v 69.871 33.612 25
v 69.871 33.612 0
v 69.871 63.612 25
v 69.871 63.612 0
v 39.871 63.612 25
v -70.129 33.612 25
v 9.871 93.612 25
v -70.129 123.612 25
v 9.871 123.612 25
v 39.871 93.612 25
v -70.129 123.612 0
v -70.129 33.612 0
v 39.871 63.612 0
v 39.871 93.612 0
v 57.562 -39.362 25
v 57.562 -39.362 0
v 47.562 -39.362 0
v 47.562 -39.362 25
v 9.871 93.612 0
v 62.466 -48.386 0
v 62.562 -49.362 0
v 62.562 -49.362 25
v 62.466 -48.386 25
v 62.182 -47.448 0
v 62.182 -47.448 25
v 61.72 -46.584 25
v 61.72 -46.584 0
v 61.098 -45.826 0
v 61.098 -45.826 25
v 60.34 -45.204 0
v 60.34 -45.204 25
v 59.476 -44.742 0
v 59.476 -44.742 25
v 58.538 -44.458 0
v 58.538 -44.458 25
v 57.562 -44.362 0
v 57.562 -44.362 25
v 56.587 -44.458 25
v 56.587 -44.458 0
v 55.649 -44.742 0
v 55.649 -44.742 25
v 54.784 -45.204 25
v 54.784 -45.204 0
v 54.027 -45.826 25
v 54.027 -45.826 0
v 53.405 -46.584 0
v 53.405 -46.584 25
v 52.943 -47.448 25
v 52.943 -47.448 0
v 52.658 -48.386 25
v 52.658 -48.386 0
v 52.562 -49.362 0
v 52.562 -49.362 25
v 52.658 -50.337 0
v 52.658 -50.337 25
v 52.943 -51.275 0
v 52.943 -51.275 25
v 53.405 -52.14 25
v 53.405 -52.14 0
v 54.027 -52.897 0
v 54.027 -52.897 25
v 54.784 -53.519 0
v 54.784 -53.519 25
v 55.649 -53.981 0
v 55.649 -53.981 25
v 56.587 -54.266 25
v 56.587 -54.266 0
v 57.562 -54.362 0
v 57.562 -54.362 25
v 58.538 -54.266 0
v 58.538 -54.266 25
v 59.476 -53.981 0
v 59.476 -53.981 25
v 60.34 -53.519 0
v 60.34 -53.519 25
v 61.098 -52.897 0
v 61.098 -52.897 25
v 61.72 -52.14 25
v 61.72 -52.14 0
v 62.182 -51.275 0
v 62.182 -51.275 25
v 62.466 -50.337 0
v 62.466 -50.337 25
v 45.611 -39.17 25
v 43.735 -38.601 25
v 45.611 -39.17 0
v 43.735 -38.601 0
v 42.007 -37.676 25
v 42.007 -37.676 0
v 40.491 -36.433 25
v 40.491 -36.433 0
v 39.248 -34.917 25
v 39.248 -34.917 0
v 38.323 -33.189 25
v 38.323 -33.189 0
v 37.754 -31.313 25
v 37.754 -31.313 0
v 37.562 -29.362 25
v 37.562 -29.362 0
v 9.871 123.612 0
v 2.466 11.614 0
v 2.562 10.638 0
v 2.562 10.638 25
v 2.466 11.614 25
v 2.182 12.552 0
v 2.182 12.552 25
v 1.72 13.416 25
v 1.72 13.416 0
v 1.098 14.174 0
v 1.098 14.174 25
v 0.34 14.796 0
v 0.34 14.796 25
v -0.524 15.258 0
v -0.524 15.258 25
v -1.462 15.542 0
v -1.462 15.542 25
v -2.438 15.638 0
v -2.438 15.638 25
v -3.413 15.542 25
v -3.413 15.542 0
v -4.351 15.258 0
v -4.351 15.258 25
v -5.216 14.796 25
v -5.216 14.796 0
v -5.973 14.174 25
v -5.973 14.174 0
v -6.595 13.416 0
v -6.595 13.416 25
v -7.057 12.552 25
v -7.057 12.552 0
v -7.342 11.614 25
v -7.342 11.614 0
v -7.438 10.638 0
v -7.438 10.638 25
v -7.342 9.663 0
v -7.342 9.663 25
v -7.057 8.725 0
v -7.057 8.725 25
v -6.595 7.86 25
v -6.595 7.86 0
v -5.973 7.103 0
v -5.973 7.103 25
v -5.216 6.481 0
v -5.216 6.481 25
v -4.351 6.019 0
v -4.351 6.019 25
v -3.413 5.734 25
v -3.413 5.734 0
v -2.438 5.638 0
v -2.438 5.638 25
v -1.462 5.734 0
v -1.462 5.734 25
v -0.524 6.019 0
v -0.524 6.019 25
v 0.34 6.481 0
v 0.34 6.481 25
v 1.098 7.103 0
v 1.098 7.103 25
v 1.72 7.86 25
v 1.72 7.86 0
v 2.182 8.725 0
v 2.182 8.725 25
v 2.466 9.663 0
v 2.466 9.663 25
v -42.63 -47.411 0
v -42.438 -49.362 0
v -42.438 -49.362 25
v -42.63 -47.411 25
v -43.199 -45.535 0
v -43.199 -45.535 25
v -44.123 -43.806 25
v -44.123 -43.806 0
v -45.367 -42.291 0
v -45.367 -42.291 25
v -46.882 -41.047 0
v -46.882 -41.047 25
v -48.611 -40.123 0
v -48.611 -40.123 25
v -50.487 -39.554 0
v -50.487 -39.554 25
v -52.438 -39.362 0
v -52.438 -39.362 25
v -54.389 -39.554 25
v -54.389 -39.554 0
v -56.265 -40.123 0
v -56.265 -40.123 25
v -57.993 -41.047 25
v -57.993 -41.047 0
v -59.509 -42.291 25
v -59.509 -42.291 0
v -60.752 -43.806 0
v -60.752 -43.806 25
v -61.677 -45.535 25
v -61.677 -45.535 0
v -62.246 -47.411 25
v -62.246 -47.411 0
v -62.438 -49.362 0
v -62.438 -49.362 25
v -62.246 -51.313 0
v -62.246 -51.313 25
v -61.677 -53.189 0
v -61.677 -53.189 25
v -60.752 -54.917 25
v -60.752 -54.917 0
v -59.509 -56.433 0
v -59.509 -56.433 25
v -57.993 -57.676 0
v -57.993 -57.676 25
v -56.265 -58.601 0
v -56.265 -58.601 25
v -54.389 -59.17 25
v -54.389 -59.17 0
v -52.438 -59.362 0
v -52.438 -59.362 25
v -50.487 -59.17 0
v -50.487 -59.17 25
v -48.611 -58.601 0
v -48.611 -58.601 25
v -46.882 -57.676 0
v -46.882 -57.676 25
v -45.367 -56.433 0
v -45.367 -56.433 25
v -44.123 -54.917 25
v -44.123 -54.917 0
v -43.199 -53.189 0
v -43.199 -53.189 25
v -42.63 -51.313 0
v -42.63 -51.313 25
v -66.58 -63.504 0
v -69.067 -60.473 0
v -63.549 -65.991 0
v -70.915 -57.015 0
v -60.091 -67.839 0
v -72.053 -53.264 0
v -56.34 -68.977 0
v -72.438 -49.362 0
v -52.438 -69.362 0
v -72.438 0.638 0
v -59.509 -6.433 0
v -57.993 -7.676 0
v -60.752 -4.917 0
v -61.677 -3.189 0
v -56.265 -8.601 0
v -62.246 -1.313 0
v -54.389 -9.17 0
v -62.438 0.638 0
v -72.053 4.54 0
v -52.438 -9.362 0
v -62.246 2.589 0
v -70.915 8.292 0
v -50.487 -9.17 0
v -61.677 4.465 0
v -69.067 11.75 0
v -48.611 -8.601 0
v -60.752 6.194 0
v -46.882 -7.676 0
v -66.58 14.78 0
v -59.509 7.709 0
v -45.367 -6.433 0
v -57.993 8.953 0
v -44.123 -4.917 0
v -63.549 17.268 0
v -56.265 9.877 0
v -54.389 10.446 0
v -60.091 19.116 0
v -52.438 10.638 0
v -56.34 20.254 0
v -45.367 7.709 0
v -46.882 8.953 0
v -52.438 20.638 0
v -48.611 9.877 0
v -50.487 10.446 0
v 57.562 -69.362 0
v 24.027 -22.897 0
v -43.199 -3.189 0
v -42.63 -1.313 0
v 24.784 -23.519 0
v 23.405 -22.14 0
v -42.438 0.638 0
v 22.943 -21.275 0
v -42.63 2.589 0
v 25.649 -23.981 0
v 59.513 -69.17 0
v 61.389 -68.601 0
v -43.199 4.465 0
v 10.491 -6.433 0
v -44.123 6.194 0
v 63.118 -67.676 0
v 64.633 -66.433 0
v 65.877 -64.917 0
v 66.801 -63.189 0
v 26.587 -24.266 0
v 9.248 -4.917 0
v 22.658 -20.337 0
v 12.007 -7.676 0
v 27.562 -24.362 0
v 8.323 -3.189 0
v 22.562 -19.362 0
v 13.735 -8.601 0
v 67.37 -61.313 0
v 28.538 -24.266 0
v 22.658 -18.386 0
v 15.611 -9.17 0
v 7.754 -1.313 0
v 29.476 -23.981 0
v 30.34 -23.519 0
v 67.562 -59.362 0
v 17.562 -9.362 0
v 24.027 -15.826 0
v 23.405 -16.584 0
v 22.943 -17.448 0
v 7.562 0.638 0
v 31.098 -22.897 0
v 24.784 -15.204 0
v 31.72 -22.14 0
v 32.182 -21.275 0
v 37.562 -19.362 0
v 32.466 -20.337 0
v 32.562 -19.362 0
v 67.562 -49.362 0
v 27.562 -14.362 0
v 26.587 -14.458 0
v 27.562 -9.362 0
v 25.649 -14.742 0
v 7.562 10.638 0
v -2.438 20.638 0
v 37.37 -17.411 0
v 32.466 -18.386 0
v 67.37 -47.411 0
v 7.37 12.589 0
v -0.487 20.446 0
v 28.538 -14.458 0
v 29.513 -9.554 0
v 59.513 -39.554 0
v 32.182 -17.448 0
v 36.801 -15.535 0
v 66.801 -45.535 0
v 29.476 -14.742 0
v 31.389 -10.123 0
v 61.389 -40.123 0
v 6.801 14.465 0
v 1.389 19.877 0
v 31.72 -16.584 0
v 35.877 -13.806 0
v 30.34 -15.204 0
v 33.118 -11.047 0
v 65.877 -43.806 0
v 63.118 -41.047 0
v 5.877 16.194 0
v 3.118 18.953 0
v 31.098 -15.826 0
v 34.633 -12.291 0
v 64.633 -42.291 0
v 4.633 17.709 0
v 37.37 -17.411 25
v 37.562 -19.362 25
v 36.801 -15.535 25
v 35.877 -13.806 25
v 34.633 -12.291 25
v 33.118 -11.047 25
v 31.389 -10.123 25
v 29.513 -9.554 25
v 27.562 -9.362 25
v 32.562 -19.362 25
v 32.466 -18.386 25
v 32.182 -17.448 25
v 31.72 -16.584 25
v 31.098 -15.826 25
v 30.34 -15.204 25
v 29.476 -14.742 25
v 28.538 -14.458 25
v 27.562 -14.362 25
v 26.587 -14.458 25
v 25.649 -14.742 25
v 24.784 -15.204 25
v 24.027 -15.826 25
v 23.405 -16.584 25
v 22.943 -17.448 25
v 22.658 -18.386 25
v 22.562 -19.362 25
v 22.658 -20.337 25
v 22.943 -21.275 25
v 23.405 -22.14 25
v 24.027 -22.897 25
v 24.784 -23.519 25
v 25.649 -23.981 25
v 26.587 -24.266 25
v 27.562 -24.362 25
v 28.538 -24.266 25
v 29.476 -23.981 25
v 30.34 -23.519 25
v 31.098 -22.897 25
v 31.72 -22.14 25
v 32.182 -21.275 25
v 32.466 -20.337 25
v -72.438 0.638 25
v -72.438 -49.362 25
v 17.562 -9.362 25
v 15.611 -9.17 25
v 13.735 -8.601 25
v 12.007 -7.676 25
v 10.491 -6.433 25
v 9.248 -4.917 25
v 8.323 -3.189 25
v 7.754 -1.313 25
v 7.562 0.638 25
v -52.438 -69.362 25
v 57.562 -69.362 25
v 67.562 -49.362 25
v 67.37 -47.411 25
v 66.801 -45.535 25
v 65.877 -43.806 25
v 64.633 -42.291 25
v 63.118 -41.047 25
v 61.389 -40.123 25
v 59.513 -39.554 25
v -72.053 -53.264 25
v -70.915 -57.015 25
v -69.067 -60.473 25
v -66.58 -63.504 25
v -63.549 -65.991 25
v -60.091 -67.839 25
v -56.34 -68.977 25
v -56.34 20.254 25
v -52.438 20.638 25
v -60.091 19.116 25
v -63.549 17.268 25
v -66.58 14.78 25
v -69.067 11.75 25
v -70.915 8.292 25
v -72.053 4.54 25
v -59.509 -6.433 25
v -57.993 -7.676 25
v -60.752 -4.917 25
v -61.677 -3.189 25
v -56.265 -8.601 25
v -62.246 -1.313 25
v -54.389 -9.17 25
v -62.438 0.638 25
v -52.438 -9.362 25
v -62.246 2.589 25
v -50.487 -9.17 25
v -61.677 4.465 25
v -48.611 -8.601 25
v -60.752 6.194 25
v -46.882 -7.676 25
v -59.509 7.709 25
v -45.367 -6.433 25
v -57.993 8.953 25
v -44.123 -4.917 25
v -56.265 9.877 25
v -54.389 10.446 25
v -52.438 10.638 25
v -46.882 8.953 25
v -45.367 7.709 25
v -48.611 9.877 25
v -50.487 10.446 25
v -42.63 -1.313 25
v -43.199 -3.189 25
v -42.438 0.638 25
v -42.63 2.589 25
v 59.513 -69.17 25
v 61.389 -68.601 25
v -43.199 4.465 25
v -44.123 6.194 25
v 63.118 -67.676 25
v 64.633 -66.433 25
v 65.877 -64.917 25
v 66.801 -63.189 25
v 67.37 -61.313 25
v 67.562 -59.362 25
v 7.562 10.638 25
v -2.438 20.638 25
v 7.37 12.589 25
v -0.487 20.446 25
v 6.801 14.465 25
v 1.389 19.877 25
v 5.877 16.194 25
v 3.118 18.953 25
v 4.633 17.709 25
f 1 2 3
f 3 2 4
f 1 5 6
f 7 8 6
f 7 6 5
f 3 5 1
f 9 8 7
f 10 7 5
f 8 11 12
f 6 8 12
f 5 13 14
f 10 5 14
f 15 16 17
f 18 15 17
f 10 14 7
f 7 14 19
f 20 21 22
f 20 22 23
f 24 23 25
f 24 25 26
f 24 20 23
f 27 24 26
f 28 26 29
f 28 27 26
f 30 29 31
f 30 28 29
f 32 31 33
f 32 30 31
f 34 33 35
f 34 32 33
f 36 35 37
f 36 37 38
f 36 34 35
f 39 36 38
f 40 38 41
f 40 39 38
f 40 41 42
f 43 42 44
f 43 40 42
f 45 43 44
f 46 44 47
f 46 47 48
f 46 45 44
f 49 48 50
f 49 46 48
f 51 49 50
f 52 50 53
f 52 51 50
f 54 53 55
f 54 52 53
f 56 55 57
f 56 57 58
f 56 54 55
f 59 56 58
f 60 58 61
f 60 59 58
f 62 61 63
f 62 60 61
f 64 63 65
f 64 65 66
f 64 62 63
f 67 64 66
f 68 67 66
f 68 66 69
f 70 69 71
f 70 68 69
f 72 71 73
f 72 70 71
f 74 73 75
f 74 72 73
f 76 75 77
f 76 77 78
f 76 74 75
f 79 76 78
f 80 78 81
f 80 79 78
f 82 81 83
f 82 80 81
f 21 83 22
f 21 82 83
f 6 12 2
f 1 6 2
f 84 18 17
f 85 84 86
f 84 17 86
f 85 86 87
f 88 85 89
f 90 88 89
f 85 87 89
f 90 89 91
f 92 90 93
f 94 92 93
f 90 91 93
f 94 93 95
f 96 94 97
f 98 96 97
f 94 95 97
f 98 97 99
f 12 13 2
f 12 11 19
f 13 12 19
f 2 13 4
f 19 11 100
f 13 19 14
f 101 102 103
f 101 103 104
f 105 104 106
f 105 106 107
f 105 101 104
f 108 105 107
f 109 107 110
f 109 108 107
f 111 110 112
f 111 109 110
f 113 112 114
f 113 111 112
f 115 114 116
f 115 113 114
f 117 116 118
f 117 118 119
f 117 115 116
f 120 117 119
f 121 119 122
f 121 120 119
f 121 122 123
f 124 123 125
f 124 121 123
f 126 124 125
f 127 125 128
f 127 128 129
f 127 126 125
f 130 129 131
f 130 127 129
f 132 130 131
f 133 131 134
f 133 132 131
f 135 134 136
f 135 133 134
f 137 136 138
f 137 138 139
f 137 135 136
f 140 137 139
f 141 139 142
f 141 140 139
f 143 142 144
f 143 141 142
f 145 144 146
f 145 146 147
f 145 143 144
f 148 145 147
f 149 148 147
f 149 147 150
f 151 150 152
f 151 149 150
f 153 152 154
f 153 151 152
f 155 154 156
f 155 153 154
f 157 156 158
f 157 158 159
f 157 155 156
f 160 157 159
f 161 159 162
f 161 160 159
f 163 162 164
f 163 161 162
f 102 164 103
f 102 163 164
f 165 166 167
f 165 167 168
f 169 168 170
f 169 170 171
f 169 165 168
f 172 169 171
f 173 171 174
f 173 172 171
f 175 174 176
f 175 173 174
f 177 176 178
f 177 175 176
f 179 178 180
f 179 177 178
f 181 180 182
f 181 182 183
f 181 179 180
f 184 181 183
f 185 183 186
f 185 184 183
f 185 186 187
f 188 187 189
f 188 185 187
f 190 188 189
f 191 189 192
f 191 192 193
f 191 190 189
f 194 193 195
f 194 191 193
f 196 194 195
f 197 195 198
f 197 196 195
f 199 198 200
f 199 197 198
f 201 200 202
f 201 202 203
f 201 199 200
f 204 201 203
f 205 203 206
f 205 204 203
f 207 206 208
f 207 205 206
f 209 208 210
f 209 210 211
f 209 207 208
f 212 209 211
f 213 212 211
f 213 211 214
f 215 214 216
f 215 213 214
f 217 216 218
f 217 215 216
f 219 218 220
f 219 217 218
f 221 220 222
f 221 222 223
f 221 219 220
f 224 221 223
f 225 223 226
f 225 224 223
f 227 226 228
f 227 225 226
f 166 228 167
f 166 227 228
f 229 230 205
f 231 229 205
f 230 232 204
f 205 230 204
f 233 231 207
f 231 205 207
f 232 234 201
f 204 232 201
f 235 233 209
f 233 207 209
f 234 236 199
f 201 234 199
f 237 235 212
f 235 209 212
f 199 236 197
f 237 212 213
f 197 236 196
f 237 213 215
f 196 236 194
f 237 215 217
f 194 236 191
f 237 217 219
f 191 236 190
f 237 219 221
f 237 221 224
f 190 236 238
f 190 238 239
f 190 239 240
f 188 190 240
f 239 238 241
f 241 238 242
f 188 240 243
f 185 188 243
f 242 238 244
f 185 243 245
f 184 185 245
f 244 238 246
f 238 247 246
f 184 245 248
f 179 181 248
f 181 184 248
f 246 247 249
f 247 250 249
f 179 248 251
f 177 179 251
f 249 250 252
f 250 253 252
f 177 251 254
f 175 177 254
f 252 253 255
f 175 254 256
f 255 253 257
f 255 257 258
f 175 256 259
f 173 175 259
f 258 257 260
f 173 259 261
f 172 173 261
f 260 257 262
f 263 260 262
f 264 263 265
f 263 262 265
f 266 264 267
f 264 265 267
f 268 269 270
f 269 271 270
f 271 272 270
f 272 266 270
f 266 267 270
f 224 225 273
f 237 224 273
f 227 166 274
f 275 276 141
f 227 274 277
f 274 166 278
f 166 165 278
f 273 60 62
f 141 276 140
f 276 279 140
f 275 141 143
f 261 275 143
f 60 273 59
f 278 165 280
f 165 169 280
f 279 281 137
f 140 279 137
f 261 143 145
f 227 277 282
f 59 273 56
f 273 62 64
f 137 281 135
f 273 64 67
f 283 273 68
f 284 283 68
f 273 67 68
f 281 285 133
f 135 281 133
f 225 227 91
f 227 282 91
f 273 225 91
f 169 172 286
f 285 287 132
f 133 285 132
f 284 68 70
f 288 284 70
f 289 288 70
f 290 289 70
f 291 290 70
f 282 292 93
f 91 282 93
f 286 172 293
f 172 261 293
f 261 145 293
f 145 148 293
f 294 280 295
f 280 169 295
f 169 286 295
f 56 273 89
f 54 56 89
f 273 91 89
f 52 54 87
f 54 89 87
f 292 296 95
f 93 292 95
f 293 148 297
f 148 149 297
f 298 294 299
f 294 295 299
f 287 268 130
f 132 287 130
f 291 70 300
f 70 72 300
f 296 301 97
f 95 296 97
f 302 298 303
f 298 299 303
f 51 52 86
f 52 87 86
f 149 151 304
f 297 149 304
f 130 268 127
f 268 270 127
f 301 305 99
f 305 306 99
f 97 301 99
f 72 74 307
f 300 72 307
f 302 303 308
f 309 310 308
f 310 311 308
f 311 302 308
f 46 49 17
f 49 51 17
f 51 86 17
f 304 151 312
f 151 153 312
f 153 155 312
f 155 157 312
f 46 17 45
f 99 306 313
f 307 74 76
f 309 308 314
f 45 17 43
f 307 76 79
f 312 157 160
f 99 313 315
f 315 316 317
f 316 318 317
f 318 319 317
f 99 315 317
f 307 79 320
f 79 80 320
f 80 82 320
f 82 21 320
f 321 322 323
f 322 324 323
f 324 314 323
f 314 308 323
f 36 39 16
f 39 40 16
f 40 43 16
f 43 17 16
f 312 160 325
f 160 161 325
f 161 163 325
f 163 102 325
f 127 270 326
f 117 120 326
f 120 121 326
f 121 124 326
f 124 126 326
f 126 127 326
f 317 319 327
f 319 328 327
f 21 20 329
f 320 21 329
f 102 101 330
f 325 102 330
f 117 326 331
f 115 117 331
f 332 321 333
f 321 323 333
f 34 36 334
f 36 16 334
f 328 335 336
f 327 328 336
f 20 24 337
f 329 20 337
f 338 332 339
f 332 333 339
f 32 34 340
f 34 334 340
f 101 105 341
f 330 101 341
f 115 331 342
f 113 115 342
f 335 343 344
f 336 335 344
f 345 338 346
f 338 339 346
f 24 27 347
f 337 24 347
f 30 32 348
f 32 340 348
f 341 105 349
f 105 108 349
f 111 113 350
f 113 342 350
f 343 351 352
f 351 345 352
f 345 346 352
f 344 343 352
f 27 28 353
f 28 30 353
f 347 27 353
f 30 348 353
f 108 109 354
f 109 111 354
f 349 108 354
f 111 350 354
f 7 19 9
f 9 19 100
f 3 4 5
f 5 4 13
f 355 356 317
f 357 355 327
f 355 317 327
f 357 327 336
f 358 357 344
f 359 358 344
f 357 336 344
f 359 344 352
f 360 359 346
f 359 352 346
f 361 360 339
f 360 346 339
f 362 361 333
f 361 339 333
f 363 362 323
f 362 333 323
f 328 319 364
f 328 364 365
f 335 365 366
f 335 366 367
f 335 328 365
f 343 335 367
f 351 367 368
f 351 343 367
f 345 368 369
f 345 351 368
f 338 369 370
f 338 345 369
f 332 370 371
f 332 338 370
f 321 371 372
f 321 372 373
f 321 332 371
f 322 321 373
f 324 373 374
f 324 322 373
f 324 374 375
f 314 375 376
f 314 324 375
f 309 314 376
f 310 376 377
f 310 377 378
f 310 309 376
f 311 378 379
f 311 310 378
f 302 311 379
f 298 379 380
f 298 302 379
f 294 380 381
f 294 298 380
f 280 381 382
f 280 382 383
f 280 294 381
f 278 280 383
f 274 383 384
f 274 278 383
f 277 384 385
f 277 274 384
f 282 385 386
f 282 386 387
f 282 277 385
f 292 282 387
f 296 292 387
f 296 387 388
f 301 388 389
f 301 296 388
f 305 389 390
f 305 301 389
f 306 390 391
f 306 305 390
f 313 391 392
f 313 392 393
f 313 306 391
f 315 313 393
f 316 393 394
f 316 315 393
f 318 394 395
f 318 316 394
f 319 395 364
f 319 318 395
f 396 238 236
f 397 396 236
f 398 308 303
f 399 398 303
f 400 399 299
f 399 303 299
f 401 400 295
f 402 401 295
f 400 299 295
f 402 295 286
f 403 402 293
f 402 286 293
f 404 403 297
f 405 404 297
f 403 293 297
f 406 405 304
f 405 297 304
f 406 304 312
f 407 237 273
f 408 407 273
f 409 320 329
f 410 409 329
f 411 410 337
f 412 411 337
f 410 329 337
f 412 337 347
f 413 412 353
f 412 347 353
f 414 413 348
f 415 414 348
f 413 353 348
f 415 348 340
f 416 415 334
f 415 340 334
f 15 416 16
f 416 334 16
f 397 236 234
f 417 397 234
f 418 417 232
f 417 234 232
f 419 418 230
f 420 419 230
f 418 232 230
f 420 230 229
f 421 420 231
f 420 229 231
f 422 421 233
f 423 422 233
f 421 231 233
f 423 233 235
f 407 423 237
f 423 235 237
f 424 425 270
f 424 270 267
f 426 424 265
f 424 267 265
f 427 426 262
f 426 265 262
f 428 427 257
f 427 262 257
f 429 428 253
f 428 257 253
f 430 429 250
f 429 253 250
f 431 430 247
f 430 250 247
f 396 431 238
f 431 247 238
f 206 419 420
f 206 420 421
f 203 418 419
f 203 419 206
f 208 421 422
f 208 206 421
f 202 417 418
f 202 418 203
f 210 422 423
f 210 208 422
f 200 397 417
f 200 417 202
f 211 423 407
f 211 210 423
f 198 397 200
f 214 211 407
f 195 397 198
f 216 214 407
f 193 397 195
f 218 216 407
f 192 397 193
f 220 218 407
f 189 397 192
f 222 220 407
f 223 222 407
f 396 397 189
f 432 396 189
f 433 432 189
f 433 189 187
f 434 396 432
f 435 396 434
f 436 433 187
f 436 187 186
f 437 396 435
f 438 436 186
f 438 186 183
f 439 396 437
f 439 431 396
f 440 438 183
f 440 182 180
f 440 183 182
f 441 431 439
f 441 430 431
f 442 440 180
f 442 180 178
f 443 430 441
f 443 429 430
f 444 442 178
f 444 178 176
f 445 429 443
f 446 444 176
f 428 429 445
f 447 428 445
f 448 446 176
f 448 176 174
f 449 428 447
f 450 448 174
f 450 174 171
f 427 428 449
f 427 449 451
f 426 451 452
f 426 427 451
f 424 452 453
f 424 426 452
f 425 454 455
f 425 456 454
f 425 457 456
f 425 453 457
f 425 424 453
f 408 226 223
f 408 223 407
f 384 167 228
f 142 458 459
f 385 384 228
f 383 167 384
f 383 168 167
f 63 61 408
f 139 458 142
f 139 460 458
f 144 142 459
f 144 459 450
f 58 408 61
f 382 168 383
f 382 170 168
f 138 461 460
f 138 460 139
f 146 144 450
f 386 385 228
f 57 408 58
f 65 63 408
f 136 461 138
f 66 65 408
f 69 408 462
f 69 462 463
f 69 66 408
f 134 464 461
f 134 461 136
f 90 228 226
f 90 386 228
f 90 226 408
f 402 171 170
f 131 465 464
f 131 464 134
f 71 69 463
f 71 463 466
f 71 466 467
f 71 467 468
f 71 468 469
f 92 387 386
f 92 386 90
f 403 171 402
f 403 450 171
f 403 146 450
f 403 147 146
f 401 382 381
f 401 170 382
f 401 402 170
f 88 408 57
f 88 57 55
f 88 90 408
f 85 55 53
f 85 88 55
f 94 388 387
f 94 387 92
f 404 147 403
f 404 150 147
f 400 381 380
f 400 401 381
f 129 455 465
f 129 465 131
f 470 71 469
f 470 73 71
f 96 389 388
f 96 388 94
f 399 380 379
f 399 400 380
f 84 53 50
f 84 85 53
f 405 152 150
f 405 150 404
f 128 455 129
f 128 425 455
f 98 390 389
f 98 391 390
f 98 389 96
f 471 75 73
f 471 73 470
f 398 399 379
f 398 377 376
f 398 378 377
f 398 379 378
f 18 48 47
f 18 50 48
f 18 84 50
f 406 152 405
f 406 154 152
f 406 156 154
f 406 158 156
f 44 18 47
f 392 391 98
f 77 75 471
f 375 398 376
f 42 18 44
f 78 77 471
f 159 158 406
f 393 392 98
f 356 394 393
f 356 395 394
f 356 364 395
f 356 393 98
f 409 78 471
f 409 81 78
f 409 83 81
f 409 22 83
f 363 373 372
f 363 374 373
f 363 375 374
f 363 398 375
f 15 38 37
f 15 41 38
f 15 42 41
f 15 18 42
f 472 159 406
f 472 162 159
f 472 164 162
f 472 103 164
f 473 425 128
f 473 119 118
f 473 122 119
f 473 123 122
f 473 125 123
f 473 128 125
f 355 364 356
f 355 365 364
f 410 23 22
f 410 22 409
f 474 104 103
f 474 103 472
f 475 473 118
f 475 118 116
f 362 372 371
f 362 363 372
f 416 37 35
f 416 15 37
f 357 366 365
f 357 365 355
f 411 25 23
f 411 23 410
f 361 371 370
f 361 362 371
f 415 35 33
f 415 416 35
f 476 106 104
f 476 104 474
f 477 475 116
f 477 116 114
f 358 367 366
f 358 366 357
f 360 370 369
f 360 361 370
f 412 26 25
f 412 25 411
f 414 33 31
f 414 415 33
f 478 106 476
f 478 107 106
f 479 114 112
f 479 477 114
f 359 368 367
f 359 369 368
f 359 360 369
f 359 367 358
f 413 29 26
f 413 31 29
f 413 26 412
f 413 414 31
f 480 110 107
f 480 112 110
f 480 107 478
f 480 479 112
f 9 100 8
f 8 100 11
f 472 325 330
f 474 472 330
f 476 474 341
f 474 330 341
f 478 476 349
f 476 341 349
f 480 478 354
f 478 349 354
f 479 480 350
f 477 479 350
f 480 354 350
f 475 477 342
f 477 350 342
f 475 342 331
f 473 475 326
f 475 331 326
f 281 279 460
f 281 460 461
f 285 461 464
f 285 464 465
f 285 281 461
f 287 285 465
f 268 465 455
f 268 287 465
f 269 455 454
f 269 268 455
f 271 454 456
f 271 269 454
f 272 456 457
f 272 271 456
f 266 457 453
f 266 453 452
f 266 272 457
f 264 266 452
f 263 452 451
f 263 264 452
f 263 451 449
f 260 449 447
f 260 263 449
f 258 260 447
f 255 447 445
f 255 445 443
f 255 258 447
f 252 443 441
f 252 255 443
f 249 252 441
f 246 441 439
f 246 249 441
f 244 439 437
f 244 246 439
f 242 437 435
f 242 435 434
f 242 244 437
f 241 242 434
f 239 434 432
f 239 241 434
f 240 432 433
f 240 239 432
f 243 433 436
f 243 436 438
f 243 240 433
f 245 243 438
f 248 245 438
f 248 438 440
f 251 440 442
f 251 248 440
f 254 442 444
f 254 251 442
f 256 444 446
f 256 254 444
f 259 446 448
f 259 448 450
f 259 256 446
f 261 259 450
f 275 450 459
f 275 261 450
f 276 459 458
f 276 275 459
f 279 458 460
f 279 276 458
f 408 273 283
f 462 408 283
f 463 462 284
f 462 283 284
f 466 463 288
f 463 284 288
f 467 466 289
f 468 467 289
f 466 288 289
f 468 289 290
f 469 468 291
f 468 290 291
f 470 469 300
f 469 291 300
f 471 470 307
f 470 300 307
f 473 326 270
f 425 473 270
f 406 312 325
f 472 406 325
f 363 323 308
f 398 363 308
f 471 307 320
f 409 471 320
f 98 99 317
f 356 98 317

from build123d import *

# Parameters (mm, degrees)
F0_R     = 10
F0_R_2   = 5
F1_DEPTH = 25


with BuildPart() as f1:
    # F0 (on Top) → F1 (new body)
    with BuildSketch(Plane.XY):
        with BuildLine():
            ThreePointArc((-72.437731, -49.361743), (-66.579867, -63.503879), (-52.437731, -69.361743))
            Line((-52.437731, -69.361743), (57.562269, -69.361743))
            ThreePointArc((57.562269, -69.361743), (64.633336, -66.432811), (67.562269, -59.361743))
            Line((67.562269, -59.361743), (67.562269, -49.361743))
            ThreePointArc((67.562269, -49.361743), (64.633336, -42.290676), (57.562269, -39.361743))
            Line((57.562269, -39.361743), (47.562269, -39.361743))
            ThreePointArc((47.562269, -39.361743), (40.491201, -36.432811), (37.562269, -29.361743))
            Line((37.562269, -29.361743), (37.562269, -19.361743))
            ThreePointArc((37.562269, -19.361743), (34.633336, -12.290676), (27.562269, -9.361743))
            Line((27.562269, -9.361743), (17.562269, -9.361743))
            ThreePointArc((17.562269, -9.361743), (10.491201, -6.432811), (7.562269, 0.638257))
            Line((7.562269, 0.638257), (7.562269, 10.638257))
            ThreePointArc((7.562269, 10.638257), (4.633336, 17.709324), (-2.437731, 20.638257))
            Line((-2.437731, 20.638257), (-52.437731, 20.638257))
            ThreePointArc((-52.437731, 20.638257), (-66.579867, 14.780392), (-72.437731, 0.638257))
            Line((-72.437731, 0.638257), (-72.437731, -49.361743))
        make_face()
        with Locations((-52.437731, -49.361743)):
            Circle(F0_R, mode=Mode.SUBTRACT)
        with Locations((-52.437731, 0.638257)):
            Circle(F0_R, mode=Mode.SUBTRACT)
        with Locations((-2.437731, 10.638257)):
            Circle(F0_R_2, mode=Mode.SUBTRACT)
        with Locations((57.562269, -49.361743)):
            Circle(F0_R_2, mode=Mode.SUBTRACT)
        with Locations((27.562269, -19.361743)):
            Circle(F0_R_2, mode=Mode.SUBTRACT)
        Polygon((-70.129156, 123.611625), (-70.129156, 33.611625), (69.870844, 33.611625), (69.870844, 63.611625), (39.870844, 63.611625), (39.870844, 93.611625), (9.870844, 93.611625), (9.870844, 123.611625), align=None)
    extrude(amount=F1_DEPTH)


solid = f1.part
